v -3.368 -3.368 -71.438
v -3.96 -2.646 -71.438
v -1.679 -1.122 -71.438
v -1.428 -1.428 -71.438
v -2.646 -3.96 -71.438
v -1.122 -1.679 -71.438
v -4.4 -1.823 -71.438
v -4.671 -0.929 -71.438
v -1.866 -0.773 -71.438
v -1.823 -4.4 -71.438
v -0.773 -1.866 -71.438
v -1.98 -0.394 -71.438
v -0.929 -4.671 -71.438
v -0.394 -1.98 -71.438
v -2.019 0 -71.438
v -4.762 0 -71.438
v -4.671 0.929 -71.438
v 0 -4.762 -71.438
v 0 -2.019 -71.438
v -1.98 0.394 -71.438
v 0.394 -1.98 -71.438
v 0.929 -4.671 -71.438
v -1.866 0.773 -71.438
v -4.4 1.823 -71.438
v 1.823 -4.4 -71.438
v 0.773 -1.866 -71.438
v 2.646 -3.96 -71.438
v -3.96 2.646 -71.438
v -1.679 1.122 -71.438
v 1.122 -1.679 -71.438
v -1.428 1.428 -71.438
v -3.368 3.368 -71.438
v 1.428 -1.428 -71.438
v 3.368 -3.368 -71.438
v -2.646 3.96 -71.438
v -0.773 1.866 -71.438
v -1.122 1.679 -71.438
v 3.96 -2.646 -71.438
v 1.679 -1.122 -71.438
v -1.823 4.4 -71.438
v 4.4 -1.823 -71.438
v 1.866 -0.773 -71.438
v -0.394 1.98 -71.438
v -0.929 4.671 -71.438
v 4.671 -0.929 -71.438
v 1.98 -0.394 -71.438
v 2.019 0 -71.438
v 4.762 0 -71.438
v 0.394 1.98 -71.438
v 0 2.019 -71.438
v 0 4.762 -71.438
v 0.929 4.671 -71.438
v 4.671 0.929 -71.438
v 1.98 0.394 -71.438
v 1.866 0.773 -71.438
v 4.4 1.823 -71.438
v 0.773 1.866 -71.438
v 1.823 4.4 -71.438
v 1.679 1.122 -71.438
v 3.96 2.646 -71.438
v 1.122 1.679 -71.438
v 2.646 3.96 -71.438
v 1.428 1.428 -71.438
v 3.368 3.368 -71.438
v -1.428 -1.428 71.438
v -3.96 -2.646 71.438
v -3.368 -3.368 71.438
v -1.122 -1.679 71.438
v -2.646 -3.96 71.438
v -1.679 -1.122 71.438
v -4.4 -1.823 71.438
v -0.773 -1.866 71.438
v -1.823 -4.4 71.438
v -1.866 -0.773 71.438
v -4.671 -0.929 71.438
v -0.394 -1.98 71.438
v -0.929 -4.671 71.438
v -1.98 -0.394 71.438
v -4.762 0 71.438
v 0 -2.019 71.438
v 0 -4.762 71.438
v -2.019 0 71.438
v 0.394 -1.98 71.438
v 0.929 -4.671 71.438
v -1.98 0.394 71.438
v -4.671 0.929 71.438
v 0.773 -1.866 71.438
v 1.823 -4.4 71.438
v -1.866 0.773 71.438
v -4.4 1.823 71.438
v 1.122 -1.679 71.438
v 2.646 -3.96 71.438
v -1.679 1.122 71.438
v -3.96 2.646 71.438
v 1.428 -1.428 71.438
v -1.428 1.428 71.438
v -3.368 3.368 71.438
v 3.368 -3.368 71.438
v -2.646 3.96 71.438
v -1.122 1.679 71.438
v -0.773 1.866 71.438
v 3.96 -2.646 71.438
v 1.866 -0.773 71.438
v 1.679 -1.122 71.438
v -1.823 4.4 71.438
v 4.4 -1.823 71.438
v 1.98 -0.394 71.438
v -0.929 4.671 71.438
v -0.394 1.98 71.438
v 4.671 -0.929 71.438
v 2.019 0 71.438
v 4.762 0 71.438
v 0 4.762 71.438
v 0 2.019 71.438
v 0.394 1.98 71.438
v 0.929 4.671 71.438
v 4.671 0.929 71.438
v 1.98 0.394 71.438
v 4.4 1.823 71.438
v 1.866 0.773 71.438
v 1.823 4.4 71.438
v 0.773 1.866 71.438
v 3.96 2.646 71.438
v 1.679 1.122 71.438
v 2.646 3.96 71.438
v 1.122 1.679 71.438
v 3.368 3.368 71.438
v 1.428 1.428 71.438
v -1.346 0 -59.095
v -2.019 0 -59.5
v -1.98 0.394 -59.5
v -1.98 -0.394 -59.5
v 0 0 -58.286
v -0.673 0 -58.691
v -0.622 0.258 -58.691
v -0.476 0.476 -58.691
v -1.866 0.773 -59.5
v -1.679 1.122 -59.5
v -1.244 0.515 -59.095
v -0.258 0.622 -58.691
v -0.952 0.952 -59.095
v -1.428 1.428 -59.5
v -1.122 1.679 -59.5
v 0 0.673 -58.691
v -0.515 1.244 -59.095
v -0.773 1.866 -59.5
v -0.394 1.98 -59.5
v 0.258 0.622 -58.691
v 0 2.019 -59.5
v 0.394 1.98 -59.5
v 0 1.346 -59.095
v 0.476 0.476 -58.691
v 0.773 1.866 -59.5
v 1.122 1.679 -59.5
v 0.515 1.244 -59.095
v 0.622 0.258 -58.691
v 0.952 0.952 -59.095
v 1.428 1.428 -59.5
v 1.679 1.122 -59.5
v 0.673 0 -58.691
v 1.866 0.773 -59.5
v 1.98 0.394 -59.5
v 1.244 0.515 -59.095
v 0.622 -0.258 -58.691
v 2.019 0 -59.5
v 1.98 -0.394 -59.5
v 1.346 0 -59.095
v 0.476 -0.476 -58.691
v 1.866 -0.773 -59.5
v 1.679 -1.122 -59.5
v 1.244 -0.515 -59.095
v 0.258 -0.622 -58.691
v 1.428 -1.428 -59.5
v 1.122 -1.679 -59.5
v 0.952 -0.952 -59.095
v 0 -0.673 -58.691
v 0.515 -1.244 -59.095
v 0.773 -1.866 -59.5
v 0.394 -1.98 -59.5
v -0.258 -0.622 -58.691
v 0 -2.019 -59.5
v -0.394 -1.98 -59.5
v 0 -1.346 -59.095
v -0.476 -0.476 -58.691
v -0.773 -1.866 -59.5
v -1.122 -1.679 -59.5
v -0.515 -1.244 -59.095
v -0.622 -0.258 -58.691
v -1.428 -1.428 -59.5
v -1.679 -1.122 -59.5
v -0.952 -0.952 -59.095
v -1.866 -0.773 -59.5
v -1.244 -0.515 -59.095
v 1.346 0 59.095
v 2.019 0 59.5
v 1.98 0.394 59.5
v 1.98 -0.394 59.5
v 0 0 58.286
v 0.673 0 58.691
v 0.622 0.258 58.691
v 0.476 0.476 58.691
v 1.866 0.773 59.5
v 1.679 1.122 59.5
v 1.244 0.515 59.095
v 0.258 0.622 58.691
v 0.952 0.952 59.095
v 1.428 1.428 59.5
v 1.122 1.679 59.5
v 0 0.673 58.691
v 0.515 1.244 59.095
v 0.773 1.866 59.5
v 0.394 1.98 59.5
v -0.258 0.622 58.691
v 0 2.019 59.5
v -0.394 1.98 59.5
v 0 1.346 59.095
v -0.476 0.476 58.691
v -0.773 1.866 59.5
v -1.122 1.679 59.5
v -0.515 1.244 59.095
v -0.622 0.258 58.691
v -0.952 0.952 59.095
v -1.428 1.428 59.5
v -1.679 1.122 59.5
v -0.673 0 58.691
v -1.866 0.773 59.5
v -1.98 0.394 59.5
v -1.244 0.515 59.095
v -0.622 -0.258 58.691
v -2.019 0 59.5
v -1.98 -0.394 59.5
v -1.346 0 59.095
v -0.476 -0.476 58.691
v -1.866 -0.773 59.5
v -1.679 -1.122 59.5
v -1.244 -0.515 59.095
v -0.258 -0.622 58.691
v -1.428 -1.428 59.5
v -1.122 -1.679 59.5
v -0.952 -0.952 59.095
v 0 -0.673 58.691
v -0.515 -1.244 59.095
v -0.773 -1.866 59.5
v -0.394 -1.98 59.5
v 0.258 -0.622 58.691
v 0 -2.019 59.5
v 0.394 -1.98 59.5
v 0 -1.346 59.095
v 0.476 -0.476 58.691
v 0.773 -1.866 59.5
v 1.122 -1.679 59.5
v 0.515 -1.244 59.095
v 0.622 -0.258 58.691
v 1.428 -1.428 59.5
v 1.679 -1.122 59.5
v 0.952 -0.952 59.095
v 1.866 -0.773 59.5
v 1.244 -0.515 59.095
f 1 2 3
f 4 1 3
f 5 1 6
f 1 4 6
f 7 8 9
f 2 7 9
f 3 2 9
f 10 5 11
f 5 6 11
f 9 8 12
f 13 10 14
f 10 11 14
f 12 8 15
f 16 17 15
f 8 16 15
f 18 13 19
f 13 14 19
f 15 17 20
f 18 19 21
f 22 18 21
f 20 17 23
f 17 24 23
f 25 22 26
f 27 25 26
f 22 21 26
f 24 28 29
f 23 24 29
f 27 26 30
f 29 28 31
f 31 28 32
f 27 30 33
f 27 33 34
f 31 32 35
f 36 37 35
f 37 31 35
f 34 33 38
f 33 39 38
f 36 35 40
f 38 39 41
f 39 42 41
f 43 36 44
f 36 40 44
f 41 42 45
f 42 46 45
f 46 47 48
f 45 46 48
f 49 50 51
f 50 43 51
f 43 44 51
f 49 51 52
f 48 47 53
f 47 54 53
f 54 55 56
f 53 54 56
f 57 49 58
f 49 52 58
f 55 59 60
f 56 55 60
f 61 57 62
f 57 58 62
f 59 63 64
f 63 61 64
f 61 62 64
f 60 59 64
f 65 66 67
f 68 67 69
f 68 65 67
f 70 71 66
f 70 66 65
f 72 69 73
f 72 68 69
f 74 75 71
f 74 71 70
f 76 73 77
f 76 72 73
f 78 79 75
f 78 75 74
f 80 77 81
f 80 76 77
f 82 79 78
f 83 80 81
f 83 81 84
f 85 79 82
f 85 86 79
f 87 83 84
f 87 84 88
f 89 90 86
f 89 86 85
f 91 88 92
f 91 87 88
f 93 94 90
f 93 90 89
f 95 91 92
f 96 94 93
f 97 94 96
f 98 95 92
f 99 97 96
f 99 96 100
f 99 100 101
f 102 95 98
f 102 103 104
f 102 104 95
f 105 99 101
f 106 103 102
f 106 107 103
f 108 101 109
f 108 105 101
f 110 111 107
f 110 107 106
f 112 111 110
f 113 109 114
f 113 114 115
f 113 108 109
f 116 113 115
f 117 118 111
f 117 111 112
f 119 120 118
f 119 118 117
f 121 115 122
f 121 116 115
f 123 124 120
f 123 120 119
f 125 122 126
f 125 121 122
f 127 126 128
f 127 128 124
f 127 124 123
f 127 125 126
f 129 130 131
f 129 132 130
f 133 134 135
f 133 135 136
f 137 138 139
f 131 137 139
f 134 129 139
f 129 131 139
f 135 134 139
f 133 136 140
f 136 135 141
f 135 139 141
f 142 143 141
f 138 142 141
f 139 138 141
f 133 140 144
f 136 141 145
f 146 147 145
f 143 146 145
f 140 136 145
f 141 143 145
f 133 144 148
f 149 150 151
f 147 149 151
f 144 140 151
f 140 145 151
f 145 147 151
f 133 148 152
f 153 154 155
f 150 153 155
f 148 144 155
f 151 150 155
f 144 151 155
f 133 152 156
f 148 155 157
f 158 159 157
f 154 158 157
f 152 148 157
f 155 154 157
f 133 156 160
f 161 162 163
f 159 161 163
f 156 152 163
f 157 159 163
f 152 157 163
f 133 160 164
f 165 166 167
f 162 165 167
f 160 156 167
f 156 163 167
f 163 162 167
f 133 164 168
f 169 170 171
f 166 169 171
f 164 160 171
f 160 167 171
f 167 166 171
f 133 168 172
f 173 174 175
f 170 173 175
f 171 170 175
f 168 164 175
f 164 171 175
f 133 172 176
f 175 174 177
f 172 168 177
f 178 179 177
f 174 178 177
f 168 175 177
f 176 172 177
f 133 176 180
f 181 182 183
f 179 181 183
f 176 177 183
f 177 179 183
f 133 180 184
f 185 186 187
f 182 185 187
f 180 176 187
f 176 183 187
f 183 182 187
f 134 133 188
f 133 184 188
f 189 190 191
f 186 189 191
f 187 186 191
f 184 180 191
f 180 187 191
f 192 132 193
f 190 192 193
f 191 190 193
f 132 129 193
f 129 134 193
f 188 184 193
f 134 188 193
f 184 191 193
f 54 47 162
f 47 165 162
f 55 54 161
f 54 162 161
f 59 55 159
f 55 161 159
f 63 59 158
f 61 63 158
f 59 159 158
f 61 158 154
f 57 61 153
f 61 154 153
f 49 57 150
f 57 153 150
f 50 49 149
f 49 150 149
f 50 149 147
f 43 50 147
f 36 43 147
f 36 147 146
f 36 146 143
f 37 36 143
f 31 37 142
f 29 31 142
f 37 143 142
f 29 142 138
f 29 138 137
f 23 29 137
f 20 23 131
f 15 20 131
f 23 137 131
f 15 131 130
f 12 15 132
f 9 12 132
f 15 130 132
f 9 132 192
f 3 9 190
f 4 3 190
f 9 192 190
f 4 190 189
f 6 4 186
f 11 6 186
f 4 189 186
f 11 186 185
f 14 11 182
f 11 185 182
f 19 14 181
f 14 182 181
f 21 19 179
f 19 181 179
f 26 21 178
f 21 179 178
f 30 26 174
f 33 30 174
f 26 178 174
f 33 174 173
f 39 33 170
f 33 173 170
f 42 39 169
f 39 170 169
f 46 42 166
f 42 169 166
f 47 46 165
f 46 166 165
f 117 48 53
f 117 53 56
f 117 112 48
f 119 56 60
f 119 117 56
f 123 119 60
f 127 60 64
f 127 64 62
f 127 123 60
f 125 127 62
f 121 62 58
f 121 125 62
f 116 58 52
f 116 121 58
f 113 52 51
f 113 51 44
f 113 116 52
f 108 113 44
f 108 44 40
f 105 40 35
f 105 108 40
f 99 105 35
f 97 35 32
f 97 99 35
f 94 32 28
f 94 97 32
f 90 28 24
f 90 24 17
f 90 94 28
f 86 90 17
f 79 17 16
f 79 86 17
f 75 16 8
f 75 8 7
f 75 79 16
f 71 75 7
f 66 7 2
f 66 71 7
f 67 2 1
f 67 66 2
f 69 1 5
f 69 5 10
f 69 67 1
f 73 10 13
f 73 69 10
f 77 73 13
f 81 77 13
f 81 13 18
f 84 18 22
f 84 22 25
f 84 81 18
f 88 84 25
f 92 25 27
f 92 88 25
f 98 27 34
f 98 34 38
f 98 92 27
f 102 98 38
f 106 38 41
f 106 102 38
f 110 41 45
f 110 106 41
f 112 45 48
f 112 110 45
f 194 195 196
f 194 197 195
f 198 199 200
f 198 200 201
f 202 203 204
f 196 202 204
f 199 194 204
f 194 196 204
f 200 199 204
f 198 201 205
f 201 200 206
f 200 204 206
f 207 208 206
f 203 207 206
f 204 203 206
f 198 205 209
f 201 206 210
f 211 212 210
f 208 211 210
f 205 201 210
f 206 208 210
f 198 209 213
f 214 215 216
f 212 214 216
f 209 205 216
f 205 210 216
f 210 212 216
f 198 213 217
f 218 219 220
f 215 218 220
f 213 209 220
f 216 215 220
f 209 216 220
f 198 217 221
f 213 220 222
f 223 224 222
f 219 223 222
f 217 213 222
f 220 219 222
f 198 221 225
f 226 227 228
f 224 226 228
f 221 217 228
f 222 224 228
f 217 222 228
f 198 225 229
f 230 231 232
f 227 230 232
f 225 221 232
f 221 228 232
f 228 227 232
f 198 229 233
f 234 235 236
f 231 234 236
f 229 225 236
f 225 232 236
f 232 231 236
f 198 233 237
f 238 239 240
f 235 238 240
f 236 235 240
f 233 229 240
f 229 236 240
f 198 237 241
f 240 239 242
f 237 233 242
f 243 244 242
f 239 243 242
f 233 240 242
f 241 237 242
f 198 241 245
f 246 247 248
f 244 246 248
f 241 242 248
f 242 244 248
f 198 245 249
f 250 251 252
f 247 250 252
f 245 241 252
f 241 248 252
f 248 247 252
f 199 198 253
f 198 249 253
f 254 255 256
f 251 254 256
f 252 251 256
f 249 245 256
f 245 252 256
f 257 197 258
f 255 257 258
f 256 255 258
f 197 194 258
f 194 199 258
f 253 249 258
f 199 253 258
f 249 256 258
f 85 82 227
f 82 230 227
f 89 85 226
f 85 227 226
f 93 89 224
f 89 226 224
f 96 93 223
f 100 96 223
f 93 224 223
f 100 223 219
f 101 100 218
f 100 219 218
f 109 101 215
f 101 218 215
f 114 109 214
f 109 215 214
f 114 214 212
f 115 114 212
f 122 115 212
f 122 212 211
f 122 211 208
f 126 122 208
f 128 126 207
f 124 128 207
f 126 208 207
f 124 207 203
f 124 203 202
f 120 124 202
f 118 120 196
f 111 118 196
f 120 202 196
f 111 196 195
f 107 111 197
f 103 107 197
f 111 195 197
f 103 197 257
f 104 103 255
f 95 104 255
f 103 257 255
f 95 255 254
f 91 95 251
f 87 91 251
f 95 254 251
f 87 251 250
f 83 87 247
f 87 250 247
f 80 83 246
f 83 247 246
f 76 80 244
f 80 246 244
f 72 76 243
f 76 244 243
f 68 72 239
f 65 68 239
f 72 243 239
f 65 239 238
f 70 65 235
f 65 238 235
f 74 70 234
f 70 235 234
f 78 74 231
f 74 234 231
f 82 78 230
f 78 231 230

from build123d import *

# Parameters (mm, degrees)
SKETCH1_R                            = 4.7625
BOSS_EXTRUDE1_DEPTH                  = 71.4375
F_10_32_TAPPED_HOLE1_D               = 4.0386
F_10_32_TAPPED_HOLE1_DEPTH           = 11.938
F_10_32_TAPPED_HOLE1_TIP             = 1.213317848
F_10_32_TAPPED_HOLE1_ON_FACE_2_D     = 4.0386
F_10_32_TAPPED_HOLE1_ON_FACE_2_DEPTH = 11.938
F_10_32_TAPPED_HOLE1_ON_FACE_2_TIP   = 1.213317848


with BuildPart() as part:
    # Sketch1 → Boss-Extrude1 (new, symmetric)
    with BuildSketch(Plane.XY):
        Circle(SKETCH1_R)
    extrude(amount=BOSS_EXTRUDE1_DEPTH, both=True)

    # #10-32 Tapped Hole1
    with Locations(Plane.XY.offset(71.4375)):
        with Locations((0, 0)):
            Hole(F_10_32_TAPPED_HOLE1_D / 2, depth=F_10_32_TAPPED_HOLE1_DEPTH)
            with Locations((0, 0, -(F_10_32_TAPPED_HOLE1_DEPTH + F_10_32_TAPPED_HOLE1_TIP / 2))):  # 118° drill point
                Cone(0, F_10_32_TAPPED_HOLE1_D / 2, F_10_32_TAPPED_HOLE1_TIP, mode=Mode.SUBTRACT)

    # #10-32 Tapped Hole1 on face 2
    with Locations(Plane(origin=(0, 0, -71.4375), x_dir=(-1, 0, 0), z_dir=(0, 0, -1))):
        with Locations((0, 0)):
            Hole(F_10_32_TAPPED_HOLE1_ON_FACE_2_D / 2, depth=F_10_32_TAPPED_HOLE1_ON_FACE_2_DEPTH)
            with Locations((0, 0, -(F_10_32_TAPPED_HOLE1_ON_FACE_2_DEPTH + F_10_32_TAPPED_HOLE1_ON_FACE_2_TIP / 2))):  # 118° drill point
                Cone(0, F_10_32_TAPPED_HOLE1_ON_FACE_2_D / 2, F_10_32_TAPPED_HOLE1_ON_FACE_2_TIP, mode=Mode.SUBTRACT)


solid = part.part
